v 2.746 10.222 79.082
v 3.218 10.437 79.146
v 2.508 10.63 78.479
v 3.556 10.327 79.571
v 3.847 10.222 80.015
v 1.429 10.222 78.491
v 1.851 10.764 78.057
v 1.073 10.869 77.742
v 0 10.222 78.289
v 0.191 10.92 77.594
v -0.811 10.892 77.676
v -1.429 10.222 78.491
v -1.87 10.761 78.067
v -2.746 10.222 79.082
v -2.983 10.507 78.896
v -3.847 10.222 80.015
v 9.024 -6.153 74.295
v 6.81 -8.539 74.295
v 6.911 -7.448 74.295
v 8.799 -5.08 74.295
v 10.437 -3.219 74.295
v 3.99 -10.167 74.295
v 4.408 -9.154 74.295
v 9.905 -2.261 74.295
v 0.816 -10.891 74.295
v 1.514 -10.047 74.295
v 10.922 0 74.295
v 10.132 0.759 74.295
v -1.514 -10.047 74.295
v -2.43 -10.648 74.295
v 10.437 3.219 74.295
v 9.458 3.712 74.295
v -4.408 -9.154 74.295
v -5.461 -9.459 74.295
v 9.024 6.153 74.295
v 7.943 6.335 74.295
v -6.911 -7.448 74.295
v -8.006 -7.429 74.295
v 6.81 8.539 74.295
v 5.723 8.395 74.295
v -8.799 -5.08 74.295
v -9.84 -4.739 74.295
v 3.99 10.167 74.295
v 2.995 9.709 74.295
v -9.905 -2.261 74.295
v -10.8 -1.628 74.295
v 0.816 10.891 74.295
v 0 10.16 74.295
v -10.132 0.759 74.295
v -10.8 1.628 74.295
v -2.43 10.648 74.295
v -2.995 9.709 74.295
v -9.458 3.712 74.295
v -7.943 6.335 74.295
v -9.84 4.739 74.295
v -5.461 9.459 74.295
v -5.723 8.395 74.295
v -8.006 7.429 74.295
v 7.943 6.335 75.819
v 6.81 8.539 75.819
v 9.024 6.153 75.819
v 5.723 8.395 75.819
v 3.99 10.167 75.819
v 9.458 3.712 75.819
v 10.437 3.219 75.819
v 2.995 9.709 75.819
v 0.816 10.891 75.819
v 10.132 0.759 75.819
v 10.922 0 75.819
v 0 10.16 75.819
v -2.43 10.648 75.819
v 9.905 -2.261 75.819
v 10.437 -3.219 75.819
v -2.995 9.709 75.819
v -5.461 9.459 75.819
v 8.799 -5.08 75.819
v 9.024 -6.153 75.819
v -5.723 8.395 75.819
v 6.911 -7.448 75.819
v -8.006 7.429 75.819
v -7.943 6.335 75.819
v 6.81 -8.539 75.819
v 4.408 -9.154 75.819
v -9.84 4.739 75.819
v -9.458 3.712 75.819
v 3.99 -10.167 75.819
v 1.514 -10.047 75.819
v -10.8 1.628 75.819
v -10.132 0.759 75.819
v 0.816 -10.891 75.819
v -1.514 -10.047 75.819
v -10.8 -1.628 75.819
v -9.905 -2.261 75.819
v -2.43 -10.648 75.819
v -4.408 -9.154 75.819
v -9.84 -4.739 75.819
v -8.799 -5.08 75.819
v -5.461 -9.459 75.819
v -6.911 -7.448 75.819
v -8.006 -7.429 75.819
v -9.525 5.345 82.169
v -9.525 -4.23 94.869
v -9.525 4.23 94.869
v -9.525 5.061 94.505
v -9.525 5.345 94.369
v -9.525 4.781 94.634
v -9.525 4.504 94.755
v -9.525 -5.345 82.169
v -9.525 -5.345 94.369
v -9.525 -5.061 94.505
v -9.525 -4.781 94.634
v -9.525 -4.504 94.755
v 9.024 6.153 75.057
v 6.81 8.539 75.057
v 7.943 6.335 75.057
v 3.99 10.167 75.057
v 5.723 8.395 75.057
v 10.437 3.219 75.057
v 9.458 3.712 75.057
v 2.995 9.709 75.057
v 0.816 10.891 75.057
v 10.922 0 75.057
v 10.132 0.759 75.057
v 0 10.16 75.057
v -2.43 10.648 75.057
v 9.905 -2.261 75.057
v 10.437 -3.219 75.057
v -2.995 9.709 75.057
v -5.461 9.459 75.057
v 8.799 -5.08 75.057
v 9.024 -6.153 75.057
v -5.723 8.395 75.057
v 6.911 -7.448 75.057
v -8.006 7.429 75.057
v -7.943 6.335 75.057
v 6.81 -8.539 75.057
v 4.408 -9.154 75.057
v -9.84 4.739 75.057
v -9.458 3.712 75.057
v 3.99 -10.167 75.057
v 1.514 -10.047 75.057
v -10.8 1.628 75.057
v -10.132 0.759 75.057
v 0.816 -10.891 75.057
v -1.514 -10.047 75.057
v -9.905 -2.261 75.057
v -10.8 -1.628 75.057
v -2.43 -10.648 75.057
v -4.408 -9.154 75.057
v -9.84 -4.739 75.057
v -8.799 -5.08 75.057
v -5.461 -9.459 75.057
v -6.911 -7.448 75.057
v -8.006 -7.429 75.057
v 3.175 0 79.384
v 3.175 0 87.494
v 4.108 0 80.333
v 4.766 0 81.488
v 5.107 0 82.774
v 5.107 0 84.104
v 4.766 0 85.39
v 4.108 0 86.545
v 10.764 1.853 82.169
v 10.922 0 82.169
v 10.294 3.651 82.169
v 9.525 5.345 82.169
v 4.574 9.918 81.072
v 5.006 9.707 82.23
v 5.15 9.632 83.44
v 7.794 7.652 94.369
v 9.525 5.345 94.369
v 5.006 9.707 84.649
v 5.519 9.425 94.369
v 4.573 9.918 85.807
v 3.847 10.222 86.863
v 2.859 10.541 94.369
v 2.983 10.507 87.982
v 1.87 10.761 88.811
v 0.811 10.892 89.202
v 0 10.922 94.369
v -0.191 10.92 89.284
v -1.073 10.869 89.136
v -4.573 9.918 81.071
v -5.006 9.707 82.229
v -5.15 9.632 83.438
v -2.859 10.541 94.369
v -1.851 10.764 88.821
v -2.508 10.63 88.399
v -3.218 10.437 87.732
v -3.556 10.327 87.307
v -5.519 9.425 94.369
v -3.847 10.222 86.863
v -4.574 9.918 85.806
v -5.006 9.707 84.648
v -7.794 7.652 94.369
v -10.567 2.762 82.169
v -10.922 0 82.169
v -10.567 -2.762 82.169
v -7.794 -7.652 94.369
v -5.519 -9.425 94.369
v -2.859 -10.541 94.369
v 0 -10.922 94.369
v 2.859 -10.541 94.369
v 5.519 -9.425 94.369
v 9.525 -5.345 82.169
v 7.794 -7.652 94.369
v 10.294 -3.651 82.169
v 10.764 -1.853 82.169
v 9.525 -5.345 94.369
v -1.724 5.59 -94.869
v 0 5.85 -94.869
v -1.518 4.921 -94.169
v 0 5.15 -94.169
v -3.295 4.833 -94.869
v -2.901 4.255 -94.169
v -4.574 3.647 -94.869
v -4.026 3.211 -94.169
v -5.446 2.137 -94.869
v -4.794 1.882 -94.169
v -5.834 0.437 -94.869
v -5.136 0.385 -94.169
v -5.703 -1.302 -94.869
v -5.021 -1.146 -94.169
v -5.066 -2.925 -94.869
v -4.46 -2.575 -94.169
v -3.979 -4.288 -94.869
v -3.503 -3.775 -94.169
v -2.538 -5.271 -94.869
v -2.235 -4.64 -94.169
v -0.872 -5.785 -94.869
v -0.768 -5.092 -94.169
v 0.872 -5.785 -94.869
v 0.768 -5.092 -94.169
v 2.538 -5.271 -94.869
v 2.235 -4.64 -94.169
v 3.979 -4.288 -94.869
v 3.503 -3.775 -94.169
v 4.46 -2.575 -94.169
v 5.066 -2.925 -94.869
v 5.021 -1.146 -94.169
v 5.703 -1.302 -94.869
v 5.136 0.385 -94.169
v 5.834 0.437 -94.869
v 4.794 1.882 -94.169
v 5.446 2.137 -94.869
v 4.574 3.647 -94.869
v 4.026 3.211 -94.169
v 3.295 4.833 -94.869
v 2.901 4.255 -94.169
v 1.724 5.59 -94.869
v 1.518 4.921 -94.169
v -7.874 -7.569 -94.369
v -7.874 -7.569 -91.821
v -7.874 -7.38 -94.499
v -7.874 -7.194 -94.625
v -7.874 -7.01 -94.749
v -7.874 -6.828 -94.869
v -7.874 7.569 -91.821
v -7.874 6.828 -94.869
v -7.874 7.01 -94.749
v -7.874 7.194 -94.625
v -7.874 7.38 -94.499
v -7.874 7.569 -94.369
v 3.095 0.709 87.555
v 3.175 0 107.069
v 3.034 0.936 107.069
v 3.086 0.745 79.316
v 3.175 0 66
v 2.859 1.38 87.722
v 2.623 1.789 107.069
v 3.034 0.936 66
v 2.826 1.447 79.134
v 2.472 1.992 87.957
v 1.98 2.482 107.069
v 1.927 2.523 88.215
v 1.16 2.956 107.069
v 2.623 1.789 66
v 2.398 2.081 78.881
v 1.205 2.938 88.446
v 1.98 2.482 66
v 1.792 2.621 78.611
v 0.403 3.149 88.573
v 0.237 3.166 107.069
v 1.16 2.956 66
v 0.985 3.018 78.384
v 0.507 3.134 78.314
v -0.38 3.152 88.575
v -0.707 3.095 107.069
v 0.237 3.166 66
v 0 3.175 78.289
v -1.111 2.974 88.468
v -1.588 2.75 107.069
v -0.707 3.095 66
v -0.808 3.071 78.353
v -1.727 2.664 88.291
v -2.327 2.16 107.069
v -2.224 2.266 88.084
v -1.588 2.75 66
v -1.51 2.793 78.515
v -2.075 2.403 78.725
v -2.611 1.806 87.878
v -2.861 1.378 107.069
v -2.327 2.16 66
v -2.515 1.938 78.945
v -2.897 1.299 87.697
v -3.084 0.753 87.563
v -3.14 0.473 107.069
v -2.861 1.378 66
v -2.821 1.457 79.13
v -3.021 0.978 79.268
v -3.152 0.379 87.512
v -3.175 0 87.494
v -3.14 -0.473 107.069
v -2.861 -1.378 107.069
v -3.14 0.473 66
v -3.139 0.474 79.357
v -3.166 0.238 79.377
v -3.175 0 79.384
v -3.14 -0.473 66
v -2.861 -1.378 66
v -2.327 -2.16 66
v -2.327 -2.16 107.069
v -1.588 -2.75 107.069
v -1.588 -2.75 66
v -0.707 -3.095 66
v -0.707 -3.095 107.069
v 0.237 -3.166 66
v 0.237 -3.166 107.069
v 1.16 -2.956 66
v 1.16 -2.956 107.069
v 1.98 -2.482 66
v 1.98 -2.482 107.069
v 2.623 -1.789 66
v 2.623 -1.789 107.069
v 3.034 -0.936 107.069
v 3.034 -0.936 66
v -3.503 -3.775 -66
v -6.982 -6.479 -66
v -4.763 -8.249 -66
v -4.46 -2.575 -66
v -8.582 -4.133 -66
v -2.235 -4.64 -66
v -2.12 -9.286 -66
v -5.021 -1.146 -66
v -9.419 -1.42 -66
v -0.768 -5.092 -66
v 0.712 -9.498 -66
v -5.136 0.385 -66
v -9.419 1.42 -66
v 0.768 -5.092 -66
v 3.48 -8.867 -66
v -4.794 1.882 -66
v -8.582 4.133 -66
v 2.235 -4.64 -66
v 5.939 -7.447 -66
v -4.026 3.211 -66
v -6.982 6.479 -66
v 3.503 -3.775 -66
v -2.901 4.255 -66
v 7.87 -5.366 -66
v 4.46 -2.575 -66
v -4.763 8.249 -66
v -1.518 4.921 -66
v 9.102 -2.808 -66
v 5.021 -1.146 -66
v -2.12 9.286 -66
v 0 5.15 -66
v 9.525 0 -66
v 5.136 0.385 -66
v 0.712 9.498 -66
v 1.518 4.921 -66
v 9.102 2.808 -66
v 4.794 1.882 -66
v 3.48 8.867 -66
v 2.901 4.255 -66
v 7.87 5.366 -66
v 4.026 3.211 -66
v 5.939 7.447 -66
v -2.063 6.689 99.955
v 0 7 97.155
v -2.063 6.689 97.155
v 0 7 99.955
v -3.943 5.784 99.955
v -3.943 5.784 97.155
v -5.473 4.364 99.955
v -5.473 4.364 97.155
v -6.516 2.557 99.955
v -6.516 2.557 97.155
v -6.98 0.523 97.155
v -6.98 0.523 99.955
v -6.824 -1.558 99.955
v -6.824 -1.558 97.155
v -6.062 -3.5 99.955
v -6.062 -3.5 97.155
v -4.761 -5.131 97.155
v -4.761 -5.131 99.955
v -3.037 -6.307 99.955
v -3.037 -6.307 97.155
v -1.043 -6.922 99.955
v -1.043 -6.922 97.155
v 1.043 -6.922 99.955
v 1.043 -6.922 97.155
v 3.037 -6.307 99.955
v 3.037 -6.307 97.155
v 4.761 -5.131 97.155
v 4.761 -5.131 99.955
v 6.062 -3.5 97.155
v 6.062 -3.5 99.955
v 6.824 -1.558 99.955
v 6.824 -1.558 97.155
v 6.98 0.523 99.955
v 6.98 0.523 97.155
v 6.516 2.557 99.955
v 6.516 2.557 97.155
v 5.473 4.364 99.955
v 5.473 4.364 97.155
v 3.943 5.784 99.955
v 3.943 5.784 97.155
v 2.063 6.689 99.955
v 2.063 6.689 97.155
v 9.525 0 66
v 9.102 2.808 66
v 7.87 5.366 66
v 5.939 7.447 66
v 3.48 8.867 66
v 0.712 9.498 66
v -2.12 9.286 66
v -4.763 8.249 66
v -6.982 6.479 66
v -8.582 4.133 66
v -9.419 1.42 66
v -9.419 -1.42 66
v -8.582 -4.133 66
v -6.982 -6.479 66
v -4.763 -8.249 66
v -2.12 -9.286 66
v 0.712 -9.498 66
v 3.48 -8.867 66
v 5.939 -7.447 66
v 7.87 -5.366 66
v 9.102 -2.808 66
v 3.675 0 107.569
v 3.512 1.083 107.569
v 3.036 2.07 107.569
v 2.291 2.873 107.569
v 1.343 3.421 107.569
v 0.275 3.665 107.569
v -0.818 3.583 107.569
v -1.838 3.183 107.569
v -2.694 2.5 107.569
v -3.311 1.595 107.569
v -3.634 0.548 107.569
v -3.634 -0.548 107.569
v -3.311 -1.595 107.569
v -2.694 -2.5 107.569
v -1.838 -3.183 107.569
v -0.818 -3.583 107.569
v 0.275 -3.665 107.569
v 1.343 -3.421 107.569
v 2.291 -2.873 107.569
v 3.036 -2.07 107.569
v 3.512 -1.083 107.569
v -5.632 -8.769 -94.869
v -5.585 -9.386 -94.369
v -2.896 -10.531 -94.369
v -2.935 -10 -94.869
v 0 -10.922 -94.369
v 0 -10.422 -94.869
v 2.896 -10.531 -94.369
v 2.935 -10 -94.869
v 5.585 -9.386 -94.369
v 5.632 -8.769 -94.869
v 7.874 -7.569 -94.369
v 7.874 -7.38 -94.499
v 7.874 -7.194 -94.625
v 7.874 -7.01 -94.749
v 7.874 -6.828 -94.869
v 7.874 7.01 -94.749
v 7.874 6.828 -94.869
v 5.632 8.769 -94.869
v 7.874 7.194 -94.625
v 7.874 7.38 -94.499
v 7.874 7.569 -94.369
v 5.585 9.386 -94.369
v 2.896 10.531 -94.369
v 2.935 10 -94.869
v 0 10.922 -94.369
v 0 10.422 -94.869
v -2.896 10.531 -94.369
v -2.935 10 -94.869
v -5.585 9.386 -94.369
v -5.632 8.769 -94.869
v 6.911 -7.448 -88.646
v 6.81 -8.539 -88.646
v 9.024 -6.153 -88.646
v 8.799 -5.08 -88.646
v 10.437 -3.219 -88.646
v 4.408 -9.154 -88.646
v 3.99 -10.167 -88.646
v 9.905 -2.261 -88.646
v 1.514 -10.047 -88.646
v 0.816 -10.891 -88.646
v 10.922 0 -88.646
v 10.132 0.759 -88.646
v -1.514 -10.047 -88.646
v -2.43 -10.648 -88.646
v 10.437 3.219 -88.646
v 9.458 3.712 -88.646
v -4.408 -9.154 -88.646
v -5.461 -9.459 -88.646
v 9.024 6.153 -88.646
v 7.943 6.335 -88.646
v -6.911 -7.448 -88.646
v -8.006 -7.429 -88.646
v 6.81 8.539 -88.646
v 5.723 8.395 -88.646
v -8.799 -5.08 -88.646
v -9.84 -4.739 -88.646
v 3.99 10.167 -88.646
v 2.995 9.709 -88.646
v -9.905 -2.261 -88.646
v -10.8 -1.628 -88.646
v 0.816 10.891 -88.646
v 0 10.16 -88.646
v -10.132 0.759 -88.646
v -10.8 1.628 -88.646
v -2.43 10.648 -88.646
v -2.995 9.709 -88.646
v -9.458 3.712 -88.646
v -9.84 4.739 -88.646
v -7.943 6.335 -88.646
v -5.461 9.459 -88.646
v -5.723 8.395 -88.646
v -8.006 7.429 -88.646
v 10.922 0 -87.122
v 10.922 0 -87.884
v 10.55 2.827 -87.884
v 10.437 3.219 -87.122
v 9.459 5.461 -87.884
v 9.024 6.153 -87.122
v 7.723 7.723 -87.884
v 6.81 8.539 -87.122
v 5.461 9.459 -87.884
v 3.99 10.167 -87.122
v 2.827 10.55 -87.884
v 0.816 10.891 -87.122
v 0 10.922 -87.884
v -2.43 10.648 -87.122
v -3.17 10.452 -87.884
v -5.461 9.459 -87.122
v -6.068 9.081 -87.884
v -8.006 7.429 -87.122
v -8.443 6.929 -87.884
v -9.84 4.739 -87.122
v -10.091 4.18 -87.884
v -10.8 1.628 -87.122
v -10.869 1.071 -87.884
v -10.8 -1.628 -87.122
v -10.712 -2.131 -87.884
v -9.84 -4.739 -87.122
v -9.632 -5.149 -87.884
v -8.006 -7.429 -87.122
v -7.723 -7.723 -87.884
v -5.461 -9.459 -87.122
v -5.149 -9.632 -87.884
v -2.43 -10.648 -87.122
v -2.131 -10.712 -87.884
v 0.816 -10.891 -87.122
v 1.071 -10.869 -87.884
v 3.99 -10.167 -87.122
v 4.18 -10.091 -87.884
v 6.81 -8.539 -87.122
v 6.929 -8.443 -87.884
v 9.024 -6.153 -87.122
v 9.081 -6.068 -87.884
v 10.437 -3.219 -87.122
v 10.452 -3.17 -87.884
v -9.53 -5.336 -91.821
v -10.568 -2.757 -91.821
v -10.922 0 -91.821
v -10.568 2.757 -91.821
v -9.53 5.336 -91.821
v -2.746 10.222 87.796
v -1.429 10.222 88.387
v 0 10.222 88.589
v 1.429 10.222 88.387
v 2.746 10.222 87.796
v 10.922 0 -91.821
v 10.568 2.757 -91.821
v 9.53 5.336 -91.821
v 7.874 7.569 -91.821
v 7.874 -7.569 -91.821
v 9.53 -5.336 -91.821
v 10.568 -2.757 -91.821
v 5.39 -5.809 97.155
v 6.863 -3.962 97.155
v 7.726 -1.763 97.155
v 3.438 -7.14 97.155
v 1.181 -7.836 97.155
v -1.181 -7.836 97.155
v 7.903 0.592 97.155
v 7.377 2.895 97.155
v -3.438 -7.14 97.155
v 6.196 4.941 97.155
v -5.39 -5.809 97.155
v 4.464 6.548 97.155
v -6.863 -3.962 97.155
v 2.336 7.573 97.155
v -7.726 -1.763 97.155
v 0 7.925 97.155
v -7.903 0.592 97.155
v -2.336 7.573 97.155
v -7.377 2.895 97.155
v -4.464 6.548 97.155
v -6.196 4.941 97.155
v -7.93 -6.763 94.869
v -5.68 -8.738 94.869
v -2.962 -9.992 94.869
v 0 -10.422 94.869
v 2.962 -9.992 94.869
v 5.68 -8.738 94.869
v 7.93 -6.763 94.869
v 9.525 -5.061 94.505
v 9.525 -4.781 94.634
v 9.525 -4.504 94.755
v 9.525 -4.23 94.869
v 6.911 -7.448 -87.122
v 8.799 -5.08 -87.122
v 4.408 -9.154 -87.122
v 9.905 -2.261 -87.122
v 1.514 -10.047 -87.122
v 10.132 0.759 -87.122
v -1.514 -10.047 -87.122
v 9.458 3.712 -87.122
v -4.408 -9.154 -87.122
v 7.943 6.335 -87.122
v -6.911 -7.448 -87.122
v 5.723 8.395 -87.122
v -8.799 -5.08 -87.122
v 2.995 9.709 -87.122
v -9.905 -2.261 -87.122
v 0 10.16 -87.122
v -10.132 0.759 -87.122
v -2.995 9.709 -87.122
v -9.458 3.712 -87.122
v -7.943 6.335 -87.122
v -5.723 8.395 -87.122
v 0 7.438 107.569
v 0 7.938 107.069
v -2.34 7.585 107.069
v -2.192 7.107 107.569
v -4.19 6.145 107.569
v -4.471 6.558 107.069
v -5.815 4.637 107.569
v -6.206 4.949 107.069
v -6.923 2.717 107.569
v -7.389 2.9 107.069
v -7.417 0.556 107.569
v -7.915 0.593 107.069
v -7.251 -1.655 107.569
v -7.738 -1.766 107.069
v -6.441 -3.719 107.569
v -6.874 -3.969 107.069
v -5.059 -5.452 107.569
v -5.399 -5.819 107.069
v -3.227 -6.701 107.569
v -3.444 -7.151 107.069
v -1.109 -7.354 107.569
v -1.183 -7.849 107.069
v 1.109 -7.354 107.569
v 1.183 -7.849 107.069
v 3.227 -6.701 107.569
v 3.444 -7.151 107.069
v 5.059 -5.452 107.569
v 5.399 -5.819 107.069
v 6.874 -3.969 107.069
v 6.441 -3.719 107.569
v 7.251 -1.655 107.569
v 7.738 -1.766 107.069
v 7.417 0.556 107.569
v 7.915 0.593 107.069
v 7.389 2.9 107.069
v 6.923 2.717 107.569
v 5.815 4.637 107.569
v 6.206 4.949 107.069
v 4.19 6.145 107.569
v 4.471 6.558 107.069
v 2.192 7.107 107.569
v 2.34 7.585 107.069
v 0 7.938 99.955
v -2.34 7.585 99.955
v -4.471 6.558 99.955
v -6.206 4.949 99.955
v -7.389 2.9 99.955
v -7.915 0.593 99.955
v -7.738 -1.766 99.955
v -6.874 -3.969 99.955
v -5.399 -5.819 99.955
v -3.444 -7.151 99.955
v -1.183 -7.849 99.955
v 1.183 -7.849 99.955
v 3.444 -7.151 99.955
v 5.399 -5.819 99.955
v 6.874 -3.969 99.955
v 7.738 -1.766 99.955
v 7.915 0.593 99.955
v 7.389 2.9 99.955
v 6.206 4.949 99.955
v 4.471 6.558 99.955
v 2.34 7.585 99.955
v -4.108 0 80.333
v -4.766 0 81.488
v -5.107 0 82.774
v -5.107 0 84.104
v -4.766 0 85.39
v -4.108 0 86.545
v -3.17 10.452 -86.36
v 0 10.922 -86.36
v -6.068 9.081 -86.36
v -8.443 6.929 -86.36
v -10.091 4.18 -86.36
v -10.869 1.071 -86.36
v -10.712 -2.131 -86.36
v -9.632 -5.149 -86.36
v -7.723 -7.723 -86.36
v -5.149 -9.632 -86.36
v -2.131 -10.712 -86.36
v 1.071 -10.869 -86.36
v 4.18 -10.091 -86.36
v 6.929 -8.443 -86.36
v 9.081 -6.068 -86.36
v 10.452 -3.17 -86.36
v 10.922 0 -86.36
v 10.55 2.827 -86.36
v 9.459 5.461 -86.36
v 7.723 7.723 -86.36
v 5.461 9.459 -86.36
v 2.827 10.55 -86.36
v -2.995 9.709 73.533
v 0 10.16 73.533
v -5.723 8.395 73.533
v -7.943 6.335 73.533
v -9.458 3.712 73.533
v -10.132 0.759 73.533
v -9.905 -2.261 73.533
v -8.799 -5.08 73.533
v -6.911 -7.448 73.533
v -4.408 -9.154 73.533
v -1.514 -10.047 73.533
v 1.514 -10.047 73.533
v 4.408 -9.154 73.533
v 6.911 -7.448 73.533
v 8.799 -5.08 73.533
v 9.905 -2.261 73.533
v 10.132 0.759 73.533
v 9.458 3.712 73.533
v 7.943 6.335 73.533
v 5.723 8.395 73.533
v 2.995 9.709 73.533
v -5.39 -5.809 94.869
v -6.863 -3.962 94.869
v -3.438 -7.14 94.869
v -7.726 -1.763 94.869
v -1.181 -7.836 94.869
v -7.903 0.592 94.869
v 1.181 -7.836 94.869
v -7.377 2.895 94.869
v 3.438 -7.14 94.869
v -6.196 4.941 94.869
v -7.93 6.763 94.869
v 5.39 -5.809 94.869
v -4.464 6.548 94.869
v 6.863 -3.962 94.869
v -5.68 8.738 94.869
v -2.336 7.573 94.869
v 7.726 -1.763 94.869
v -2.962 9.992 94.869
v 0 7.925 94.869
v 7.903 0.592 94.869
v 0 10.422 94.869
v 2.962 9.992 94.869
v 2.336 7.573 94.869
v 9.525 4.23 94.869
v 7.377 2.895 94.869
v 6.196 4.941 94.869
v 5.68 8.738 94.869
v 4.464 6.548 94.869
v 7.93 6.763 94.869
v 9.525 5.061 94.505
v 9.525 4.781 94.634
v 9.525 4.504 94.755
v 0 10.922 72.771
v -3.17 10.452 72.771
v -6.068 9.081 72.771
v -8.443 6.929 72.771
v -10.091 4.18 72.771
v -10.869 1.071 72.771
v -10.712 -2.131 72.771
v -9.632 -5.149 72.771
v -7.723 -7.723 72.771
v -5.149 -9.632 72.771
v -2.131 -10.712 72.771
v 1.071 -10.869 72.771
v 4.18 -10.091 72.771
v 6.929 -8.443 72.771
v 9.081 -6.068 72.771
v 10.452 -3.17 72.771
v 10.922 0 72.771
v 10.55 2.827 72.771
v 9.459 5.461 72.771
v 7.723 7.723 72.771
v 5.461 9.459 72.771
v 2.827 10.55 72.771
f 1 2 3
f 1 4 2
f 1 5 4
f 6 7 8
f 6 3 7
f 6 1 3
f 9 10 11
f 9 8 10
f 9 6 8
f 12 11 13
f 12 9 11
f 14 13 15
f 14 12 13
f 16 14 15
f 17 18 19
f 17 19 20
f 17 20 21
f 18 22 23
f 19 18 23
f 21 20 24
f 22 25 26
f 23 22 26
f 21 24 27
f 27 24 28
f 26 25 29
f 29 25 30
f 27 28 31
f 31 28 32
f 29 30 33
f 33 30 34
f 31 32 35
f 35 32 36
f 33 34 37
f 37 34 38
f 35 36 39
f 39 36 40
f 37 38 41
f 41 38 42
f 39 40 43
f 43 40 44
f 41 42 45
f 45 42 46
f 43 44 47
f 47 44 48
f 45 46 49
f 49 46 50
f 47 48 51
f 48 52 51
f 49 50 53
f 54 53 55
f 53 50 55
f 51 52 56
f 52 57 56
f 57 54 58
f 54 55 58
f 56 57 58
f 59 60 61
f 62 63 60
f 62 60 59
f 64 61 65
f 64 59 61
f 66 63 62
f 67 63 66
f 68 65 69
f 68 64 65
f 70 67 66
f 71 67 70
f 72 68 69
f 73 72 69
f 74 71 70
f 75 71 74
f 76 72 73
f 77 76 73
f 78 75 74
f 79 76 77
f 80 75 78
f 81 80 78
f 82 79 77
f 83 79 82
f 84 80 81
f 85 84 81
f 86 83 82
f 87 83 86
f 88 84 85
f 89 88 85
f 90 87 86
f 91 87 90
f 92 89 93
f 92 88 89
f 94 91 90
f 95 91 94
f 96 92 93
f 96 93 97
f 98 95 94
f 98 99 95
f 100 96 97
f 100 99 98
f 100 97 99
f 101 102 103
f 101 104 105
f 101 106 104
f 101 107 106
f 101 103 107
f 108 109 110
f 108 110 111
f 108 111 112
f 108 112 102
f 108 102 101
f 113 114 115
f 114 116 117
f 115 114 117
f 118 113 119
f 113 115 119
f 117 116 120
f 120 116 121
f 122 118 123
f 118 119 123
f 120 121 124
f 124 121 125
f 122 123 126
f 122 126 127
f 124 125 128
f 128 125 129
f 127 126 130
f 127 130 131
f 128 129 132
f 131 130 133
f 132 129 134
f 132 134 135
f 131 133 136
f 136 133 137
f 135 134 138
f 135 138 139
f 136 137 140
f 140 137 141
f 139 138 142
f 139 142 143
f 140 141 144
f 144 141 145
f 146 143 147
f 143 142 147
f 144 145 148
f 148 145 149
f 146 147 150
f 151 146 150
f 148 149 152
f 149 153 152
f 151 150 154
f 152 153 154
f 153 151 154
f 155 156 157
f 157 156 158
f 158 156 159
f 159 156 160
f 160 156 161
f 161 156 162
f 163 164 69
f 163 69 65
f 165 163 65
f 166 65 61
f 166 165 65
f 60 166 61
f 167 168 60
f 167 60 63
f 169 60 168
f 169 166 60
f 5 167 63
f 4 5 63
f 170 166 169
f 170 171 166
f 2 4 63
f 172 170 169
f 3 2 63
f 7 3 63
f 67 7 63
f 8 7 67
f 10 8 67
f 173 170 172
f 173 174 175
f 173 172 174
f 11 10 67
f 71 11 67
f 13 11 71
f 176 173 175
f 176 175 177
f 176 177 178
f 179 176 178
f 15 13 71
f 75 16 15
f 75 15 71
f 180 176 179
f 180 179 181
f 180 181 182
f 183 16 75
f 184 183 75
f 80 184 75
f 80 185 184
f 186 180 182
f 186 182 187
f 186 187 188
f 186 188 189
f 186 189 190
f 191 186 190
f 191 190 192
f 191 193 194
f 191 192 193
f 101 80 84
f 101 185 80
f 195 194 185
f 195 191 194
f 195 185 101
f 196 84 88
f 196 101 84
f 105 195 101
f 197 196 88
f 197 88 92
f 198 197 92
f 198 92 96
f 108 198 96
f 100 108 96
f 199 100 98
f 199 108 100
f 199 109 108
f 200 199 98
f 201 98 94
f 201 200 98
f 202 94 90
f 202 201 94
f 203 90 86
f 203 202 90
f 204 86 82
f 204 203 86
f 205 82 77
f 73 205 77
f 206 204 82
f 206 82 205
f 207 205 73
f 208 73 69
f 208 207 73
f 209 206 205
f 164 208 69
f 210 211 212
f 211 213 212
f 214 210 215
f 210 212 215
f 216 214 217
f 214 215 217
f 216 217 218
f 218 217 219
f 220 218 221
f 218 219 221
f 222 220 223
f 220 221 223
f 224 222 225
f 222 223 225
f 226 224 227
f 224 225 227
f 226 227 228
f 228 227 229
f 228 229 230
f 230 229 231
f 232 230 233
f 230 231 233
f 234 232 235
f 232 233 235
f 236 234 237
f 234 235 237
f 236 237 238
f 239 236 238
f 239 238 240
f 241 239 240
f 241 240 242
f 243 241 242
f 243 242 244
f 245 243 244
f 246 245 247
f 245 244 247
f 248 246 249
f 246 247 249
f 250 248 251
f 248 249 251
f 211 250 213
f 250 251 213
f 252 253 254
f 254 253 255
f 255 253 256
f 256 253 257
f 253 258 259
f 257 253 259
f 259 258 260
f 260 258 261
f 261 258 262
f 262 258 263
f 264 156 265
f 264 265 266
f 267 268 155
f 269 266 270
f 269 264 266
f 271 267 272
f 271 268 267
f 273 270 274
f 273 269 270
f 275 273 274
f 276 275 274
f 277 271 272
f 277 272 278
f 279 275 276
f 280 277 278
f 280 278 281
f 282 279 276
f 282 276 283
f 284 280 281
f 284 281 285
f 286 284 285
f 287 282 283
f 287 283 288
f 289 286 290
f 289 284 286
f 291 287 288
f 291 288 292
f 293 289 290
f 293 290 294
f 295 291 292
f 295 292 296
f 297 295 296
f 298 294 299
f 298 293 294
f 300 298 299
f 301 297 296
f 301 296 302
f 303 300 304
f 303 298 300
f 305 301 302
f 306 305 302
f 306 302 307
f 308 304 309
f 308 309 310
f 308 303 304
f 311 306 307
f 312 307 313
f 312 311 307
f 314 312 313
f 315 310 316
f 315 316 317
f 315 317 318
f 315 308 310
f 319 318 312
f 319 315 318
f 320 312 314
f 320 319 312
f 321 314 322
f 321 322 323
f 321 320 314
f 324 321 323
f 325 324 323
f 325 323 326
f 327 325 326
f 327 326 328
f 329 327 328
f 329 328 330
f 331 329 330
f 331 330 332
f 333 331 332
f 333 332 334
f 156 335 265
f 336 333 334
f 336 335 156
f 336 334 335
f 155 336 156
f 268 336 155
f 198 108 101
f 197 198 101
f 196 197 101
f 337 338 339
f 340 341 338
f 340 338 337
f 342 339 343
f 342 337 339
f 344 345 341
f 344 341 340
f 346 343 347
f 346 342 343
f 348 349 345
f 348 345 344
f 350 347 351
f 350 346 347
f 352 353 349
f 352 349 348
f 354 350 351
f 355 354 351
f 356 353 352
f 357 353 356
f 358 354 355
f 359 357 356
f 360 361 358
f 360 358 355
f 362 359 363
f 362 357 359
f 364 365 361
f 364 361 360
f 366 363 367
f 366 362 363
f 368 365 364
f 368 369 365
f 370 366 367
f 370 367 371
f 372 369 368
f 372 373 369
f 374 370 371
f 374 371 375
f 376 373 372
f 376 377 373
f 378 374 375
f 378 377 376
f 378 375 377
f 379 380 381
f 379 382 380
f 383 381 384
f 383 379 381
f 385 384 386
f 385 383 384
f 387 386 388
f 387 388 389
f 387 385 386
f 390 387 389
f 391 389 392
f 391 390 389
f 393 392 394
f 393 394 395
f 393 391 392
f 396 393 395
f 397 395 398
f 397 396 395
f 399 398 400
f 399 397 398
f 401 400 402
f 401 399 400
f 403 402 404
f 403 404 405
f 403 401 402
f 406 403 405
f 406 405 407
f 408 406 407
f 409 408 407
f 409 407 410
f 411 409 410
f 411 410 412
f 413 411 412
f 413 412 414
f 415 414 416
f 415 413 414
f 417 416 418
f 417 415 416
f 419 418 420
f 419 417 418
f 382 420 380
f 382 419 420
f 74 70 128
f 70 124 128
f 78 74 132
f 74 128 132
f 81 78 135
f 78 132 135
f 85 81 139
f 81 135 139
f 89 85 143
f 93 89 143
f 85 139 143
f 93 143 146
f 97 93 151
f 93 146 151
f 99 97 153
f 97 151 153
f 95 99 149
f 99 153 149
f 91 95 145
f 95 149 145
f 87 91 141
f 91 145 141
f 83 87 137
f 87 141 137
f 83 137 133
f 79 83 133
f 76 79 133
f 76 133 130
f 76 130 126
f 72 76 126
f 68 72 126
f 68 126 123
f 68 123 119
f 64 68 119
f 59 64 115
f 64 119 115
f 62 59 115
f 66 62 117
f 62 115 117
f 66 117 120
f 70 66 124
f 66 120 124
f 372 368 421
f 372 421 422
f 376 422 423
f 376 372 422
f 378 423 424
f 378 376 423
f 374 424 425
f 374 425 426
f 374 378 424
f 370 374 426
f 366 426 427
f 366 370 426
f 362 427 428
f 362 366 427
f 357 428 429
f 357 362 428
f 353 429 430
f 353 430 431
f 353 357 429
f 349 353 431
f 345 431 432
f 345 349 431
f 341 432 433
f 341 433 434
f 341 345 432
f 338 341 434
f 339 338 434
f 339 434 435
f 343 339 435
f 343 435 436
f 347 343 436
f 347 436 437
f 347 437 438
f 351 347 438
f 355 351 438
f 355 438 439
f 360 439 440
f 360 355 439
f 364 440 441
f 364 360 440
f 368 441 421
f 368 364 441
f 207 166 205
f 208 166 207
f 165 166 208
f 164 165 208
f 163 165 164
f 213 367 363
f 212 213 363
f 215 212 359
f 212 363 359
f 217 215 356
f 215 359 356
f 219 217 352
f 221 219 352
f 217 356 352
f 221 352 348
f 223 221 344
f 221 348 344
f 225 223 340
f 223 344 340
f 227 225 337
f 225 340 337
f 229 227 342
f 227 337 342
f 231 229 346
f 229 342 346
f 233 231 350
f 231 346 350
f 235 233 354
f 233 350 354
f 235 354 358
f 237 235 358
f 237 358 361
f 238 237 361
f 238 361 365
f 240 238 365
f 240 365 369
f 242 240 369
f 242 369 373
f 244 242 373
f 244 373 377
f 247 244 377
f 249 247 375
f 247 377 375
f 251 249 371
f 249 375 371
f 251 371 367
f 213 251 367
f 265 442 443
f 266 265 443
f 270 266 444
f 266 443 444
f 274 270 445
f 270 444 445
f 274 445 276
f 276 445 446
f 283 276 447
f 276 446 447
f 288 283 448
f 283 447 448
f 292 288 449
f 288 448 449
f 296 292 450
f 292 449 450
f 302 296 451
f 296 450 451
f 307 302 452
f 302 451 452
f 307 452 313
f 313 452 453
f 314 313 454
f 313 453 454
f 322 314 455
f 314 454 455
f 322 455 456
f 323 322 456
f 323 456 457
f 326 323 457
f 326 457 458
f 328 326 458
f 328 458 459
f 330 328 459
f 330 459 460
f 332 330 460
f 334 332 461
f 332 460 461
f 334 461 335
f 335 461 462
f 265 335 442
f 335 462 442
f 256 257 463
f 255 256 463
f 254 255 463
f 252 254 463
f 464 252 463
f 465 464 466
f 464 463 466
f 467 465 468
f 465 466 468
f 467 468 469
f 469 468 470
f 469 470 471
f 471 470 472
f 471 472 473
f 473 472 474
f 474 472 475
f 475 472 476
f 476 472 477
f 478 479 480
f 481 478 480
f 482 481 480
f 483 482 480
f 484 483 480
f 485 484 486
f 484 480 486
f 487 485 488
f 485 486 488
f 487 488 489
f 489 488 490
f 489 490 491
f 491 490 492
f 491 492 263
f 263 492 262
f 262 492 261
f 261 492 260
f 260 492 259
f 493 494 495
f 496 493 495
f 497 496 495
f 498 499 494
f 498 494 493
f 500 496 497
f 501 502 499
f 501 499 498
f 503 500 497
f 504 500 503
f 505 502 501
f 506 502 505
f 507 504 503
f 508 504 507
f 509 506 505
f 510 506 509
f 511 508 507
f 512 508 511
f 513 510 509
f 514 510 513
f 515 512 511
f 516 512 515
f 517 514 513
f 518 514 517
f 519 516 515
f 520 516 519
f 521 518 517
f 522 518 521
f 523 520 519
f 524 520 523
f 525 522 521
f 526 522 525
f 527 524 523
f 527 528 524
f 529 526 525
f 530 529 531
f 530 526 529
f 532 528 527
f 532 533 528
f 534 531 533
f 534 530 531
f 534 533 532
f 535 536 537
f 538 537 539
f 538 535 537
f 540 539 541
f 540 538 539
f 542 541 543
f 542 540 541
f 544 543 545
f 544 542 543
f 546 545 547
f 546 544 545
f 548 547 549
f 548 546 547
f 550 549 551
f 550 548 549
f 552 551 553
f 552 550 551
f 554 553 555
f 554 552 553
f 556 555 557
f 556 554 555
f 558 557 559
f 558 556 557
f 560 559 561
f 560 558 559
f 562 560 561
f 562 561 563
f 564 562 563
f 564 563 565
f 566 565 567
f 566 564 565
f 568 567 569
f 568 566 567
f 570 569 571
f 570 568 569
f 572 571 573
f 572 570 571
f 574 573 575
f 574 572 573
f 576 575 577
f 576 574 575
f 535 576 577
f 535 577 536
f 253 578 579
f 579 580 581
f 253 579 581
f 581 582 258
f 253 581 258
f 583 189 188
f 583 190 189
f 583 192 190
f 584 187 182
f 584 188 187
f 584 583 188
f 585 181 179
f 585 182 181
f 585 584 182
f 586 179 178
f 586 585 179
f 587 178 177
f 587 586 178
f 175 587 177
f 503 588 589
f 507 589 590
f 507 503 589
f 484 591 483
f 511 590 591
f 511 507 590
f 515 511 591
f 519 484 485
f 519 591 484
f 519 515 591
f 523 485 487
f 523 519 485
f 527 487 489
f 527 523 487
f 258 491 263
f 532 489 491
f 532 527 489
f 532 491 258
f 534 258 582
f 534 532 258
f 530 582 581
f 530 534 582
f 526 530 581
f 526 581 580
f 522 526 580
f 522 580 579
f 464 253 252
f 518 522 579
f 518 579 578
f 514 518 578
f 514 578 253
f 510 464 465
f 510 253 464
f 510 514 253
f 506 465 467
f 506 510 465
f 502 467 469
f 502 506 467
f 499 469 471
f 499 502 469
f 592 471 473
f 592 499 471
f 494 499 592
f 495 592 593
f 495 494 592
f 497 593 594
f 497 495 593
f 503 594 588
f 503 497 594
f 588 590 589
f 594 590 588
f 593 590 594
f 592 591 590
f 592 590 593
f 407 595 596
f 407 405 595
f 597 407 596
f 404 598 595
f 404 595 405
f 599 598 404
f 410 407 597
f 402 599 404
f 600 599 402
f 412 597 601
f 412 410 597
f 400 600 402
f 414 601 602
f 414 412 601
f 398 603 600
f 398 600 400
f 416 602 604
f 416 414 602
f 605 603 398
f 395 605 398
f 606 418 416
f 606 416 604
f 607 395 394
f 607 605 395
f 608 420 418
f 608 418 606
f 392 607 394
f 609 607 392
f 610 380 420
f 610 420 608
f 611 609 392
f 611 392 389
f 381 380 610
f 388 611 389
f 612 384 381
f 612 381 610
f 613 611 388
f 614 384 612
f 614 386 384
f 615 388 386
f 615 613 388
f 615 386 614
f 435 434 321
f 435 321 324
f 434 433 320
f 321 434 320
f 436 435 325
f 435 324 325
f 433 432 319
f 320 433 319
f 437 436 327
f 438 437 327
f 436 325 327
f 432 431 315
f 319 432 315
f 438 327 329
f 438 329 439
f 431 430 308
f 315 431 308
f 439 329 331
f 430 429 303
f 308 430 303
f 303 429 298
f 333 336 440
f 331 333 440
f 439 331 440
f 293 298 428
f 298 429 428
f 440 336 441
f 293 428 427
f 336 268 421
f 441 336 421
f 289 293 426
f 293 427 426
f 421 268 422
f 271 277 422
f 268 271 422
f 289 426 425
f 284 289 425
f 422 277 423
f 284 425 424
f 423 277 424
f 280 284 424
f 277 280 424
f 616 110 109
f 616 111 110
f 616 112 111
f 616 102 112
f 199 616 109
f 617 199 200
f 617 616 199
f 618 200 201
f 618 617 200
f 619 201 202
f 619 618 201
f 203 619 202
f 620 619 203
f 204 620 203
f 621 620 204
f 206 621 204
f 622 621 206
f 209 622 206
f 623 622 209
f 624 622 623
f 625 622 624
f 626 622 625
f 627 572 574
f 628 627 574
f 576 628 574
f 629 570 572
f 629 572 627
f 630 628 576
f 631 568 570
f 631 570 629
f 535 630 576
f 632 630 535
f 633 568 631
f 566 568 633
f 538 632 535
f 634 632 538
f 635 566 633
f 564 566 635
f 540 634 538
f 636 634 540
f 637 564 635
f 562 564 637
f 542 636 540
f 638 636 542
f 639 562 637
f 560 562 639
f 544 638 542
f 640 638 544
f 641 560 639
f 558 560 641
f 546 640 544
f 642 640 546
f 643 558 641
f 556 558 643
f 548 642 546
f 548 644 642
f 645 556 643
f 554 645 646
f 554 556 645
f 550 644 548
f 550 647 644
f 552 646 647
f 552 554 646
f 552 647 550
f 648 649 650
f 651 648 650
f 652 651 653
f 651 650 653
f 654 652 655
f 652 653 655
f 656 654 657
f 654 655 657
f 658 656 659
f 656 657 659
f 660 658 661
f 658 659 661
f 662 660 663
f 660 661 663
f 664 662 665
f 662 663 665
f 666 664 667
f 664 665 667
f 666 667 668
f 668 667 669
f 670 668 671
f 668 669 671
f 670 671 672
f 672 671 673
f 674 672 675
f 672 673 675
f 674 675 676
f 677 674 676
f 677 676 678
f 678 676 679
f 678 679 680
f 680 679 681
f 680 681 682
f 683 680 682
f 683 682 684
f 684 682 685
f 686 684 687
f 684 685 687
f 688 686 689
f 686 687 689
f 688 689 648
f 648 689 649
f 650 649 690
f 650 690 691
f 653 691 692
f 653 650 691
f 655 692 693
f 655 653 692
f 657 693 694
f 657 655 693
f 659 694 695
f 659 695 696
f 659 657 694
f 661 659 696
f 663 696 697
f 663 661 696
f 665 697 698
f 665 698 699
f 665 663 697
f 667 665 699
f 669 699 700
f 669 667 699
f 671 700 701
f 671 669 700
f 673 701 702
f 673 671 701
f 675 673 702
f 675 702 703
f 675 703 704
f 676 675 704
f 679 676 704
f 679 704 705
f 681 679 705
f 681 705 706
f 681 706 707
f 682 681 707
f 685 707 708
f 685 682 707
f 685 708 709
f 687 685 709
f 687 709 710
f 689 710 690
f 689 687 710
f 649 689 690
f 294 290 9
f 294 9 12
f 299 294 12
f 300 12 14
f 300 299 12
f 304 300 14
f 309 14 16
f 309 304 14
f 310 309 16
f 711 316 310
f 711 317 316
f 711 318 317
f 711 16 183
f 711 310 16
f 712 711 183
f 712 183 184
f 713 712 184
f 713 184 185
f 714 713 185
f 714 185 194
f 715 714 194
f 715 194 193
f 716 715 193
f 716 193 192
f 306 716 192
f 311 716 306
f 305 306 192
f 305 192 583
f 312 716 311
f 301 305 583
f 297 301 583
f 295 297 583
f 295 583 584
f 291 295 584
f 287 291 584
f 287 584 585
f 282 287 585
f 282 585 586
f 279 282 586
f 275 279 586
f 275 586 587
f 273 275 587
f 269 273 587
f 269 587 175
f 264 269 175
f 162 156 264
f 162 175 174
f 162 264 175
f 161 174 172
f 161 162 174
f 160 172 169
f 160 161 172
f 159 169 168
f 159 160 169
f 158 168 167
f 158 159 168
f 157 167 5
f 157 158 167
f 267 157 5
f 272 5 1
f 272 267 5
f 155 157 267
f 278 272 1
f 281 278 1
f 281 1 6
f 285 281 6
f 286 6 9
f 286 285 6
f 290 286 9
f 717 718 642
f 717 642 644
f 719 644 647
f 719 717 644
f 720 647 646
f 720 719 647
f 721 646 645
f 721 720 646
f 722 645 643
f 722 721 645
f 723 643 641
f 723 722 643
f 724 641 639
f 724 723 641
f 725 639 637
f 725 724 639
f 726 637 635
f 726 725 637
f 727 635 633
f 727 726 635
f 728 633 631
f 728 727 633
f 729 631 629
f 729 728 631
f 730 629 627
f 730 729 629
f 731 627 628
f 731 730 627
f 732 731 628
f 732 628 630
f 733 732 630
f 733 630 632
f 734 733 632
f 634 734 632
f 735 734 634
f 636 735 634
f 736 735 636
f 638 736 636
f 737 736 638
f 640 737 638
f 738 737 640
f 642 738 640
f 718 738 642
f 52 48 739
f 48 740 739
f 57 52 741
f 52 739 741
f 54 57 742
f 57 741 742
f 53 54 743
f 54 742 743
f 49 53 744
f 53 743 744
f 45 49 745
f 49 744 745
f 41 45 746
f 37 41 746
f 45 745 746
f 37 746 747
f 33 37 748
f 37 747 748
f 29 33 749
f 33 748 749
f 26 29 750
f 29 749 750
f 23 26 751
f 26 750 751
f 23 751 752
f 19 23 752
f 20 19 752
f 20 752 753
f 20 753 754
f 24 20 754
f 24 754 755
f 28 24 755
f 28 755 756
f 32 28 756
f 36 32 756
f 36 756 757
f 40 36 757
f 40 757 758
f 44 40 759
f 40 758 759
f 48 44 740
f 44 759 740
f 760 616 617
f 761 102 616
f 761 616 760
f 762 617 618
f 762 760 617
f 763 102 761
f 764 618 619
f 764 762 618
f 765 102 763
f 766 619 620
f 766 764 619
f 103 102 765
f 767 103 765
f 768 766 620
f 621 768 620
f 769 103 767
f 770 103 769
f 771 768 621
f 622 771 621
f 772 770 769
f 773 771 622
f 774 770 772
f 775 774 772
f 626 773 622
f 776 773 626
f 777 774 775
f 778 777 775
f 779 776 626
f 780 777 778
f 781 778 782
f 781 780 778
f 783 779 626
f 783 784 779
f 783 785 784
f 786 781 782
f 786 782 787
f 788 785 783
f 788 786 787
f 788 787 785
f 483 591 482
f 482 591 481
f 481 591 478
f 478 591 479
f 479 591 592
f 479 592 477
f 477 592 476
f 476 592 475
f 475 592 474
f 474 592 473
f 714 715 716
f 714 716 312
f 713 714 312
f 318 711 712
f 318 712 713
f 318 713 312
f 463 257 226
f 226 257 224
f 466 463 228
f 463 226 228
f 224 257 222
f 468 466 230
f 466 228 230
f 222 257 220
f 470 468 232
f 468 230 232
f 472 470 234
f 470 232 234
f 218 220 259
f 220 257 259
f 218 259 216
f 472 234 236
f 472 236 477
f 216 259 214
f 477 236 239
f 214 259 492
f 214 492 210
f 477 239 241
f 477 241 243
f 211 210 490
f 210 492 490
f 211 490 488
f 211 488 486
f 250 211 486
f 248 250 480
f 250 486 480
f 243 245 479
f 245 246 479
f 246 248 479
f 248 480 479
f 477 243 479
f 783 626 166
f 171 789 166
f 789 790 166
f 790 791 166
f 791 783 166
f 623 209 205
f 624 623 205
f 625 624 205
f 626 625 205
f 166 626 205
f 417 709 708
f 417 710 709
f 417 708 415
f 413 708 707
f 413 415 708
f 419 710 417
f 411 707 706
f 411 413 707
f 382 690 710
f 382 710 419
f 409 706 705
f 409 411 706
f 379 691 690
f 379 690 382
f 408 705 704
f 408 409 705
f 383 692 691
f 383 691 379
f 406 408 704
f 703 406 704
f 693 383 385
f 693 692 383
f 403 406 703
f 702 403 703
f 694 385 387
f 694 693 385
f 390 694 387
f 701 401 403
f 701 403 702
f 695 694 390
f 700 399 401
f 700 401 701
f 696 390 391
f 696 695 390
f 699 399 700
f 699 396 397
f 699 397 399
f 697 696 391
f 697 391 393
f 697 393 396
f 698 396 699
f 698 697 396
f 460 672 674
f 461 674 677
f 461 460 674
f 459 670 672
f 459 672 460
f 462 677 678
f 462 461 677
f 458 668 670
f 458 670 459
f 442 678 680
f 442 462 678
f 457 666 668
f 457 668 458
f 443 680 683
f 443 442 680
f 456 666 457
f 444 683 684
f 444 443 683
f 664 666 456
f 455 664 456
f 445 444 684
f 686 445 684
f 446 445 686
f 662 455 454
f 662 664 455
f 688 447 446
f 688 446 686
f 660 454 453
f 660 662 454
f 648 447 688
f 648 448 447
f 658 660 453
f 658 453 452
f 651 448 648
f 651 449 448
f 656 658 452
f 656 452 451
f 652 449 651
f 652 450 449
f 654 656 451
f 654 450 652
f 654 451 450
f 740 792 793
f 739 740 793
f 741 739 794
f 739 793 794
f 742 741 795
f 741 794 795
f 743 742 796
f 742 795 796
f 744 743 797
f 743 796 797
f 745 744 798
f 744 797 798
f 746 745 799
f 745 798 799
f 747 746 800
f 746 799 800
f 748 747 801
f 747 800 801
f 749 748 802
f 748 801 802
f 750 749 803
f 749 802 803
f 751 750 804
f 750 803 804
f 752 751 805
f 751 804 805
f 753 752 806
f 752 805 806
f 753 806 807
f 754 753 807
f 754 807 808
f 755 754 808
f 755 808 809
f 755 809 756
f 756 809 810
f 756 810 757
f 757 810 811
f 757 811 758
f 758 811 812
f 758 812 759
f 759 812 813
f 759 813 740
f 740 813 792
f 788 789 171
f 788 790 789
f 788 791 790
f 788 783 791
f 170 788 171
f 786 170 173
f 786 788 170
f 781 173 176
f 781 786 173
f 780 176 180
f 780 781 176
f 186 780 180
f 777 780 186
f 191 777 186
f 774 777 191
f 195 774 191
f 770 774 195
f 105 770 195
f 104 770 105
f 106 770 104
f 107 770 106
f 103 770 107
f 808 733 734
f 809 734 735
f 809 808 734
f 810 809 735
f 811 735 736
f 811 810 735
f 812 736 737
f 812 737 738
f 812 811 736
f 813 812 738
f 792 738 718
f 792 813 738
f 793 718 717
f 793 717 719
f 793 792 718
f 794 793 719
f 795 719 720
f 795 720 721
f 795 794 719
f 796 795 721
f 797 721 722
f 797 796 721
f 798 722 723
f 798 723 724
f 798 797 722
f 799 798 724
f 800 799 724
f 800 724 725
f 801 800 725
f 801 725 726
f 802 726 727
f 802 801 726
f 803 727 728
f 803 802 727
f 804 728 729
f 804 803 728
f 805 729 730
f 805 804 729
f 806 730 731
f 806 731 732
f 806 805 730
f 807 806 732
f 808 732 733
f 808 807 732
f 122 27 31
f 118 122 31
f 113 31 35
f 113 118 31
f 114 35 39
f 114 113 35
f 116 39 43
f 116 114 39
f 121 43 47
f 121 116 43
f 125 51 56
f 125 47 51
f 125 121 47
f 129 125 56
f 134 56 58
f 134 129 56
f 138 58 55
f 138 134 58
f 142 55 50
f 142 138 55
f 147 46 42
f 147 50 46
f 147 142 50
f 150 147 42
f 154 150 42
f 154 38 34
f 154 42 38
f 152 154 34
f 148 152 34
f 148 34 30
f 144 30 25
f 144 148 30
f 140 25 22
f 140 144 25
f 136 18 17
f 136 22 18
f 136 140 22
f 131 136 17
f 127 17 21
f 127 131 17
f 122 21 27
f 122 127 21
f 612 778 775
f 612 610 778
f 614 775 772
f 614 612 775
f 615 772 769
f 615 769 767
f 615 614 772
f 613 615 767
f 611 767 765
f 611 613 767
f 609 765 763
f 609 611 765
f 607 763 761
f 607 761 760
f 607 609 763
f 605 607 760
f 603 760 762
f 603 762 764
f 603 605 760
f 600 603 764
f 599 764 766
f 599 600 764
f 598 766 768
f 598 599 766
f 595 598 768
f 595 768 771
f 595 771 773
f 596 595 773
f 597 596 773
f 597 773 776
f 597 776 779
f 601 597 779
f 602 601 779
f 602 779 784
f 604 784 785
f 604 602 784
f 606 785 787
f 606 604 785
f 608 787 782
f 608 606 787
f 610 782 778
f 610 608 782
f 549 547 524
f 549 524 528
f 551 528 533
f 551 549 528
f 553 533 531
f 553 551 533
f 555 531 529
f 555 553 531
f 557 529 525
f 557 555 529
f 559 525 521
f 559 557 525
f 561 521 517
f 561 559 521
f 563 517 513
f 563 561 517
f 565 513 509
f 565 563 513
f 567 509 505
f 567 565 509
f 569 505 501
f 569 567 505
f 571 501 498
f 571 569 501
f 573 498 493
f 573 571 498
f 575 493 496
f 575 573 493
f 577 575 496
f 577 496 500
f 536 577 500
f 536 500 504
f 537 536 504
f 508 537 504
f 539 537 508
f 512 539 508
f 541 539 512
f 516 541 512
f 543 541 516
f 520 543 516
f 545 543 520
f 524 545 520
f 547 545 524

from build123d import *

# Parameters (mm, degrees)
SKETCH1_R           = 10.922
EXTRUDE1_DEPTH      = 94.869
EXTRUDE1_DEPTH_BACK = 94.869
SKETCH3_W           = 0.762
SKETCH3_H           = 0.762
RODHOLE_START       = -173.569
SKETCH8_R           = 3.175
RODHOLE_DEPTH       = 173.569
SKETCH9_R           = 9.525
STROKECHAMBER_DEPTH = 132
CHAMFER1_SIZE       = 0.5
SKETCH4_W           = 1.397
SKETCH4_H           = 12.7
SKETCH4_W_2         = 3.048
SKETCH4_H_2         = 3.048
FLATS_DEPTH         = 11.9220001
FLATS_DEPTH_BACK    = 11.9220001


with BuildPart() as part:
    # Sketch1 → Extrude1 (new body, two sides)
    with BuildSketch(Plane.XY) as extrude1_sk:
        Circle(SKETCH1_R)
    extrude(amount=EXTRUDE1_DEPTH)
    extrude(extrude1_sk.sketch, amount=-EXTRUDE1_DEPTH_BACK)

    # Sketch2 → Nose (revolve)
    with BuildSketch(Plane(origin=(0, 0, 0), x_dir=(0, 0, -1), z_dir=(1, 0, 0))):
        Polygon((-94.869, 7.9248), (-97.155, 7.9248), (-97.155, 7), (-99.955, 7), (-99.955, 7.9375), (-107.569, 7.9375), (-107.569, 0), (-94.869, 0), align=None)
    revolve(axis=Axis((0, 0, 0), (0, 0, 1)))

    # Sketch3 → CoverGrooves (revolve, cut)
    with BuildSketch(Plane(origin=(0, 0, 0), x_dir=(0, 0, -1), z_dir=(1, 0, 0))):
        with Locations((-75.438, 10.541)):
            Rectangle(SKETCH3_W, SKETCH3_H)
        Polygon((-74.295, 10.922), (-74.295, 10.16), (-73.533, 10.16), (-72.771, 10.922), align=None)
        Polygon((88.646, 10.922), (88.646, 10.16), (87.884, 10.922), align=None)
        Polygon((87.122, 10.922), (87.122, 10.16), (86.36, 10.922), align=None)
    revolve(axis=Axis((0, 0, 0), (0, 0, 1)), mode=Mode.SUBTRACT)

    # Sketch7 → FrontPort (revolve, cut)
    with BuildSketch(Plane(origin=(0, 0, 0), x_dir=(0, 0, -1), z_dir=(1, 0, 0))):
        Polygon((-83.439, 10.922), (-77.589, 10.922), (-78.289, 10.222), (-78.289, 0), (-83.439, 0), align=None)
    revolve(axis=Axis((0, 0, 83.439), (0, 1, 0)), mode=Mode.SUBTRACT)

    # Sketch8 → RodHole (cut)
    with BuildSketch(Plane.XY.offset(107.569).offset(RODHOLE_START)):
        Circle(SKETCH8_R)
    extrude(amount=RODHOLE_DEPTH, mode=Mode.SUBTRACT)

    # Sketch9 → StrokeChamber (cut)
    with BuildSketch(Plane.XY.offset(-66)):
        Circle(SKETCH9_R)
    extrude(amount=STROKECHAMBER_DEPTH, mode=Mode.SUBTRACT)

    # Chamfer1
    chamfer1_edges = [part.edges().sort_by_distance(p)[0] for p in [
        (-10.922, 0, -94.869),
        (-3.175, 0, 107.569),
        (0, -7.9375, 107.569),
        (-10.922, 0, 94.869),
    ]]
    chamfer(chamfer1_edges, length=CHAMFER1_SIZE)

    # Sketch4 → Flats (cut, two sides)
    with BuildSketch(Plane(origin=(0, 0, 0), x_dir=(1, 0, 0), z_dir=(0, 1, 0))) as flats_sk:
        with Locations((10.2235, -88.519)):
            Rectangle(SKETCH4_W, SKETCH4_H)
        with Locations((9.398, 93.345)):
            Rectangle(SKETCH4_W_2, SKETCH4_H_2)
        with Locations((-9.398, 93.345)):
            Rectangle(SKETCH4_W_2, SKETCH4_H_2)
        with Locations((-10.2235, -88.519)):
            Rectangle(SKETCH4_W, SKETCH4_H)
    extrude(amount=FLATS_DEPTH, mode=Mode.SUBTRACT)
    extrude(flats_sk.sketch, amount=-FLATS_DEPTH_BACK, mode=Mode.SUBTRACT)

    # Sketch10 → RearStdPort (revolve, cut)
    with BuildSketch(Plane(origin=(0, 0, 0), x_dir=(0, 0, -1), z_dir=(1, 0, 0))):
        Polygon((94.869, 0), (94.869, 5.85), (94.169, 5.15), (0, 5.15), (0, 0), align=None)
    revolve(axis=Axis((0, 0, 0), (0, 0, 1)), mode=Mode.SUBTRACT)


solid = part.part
